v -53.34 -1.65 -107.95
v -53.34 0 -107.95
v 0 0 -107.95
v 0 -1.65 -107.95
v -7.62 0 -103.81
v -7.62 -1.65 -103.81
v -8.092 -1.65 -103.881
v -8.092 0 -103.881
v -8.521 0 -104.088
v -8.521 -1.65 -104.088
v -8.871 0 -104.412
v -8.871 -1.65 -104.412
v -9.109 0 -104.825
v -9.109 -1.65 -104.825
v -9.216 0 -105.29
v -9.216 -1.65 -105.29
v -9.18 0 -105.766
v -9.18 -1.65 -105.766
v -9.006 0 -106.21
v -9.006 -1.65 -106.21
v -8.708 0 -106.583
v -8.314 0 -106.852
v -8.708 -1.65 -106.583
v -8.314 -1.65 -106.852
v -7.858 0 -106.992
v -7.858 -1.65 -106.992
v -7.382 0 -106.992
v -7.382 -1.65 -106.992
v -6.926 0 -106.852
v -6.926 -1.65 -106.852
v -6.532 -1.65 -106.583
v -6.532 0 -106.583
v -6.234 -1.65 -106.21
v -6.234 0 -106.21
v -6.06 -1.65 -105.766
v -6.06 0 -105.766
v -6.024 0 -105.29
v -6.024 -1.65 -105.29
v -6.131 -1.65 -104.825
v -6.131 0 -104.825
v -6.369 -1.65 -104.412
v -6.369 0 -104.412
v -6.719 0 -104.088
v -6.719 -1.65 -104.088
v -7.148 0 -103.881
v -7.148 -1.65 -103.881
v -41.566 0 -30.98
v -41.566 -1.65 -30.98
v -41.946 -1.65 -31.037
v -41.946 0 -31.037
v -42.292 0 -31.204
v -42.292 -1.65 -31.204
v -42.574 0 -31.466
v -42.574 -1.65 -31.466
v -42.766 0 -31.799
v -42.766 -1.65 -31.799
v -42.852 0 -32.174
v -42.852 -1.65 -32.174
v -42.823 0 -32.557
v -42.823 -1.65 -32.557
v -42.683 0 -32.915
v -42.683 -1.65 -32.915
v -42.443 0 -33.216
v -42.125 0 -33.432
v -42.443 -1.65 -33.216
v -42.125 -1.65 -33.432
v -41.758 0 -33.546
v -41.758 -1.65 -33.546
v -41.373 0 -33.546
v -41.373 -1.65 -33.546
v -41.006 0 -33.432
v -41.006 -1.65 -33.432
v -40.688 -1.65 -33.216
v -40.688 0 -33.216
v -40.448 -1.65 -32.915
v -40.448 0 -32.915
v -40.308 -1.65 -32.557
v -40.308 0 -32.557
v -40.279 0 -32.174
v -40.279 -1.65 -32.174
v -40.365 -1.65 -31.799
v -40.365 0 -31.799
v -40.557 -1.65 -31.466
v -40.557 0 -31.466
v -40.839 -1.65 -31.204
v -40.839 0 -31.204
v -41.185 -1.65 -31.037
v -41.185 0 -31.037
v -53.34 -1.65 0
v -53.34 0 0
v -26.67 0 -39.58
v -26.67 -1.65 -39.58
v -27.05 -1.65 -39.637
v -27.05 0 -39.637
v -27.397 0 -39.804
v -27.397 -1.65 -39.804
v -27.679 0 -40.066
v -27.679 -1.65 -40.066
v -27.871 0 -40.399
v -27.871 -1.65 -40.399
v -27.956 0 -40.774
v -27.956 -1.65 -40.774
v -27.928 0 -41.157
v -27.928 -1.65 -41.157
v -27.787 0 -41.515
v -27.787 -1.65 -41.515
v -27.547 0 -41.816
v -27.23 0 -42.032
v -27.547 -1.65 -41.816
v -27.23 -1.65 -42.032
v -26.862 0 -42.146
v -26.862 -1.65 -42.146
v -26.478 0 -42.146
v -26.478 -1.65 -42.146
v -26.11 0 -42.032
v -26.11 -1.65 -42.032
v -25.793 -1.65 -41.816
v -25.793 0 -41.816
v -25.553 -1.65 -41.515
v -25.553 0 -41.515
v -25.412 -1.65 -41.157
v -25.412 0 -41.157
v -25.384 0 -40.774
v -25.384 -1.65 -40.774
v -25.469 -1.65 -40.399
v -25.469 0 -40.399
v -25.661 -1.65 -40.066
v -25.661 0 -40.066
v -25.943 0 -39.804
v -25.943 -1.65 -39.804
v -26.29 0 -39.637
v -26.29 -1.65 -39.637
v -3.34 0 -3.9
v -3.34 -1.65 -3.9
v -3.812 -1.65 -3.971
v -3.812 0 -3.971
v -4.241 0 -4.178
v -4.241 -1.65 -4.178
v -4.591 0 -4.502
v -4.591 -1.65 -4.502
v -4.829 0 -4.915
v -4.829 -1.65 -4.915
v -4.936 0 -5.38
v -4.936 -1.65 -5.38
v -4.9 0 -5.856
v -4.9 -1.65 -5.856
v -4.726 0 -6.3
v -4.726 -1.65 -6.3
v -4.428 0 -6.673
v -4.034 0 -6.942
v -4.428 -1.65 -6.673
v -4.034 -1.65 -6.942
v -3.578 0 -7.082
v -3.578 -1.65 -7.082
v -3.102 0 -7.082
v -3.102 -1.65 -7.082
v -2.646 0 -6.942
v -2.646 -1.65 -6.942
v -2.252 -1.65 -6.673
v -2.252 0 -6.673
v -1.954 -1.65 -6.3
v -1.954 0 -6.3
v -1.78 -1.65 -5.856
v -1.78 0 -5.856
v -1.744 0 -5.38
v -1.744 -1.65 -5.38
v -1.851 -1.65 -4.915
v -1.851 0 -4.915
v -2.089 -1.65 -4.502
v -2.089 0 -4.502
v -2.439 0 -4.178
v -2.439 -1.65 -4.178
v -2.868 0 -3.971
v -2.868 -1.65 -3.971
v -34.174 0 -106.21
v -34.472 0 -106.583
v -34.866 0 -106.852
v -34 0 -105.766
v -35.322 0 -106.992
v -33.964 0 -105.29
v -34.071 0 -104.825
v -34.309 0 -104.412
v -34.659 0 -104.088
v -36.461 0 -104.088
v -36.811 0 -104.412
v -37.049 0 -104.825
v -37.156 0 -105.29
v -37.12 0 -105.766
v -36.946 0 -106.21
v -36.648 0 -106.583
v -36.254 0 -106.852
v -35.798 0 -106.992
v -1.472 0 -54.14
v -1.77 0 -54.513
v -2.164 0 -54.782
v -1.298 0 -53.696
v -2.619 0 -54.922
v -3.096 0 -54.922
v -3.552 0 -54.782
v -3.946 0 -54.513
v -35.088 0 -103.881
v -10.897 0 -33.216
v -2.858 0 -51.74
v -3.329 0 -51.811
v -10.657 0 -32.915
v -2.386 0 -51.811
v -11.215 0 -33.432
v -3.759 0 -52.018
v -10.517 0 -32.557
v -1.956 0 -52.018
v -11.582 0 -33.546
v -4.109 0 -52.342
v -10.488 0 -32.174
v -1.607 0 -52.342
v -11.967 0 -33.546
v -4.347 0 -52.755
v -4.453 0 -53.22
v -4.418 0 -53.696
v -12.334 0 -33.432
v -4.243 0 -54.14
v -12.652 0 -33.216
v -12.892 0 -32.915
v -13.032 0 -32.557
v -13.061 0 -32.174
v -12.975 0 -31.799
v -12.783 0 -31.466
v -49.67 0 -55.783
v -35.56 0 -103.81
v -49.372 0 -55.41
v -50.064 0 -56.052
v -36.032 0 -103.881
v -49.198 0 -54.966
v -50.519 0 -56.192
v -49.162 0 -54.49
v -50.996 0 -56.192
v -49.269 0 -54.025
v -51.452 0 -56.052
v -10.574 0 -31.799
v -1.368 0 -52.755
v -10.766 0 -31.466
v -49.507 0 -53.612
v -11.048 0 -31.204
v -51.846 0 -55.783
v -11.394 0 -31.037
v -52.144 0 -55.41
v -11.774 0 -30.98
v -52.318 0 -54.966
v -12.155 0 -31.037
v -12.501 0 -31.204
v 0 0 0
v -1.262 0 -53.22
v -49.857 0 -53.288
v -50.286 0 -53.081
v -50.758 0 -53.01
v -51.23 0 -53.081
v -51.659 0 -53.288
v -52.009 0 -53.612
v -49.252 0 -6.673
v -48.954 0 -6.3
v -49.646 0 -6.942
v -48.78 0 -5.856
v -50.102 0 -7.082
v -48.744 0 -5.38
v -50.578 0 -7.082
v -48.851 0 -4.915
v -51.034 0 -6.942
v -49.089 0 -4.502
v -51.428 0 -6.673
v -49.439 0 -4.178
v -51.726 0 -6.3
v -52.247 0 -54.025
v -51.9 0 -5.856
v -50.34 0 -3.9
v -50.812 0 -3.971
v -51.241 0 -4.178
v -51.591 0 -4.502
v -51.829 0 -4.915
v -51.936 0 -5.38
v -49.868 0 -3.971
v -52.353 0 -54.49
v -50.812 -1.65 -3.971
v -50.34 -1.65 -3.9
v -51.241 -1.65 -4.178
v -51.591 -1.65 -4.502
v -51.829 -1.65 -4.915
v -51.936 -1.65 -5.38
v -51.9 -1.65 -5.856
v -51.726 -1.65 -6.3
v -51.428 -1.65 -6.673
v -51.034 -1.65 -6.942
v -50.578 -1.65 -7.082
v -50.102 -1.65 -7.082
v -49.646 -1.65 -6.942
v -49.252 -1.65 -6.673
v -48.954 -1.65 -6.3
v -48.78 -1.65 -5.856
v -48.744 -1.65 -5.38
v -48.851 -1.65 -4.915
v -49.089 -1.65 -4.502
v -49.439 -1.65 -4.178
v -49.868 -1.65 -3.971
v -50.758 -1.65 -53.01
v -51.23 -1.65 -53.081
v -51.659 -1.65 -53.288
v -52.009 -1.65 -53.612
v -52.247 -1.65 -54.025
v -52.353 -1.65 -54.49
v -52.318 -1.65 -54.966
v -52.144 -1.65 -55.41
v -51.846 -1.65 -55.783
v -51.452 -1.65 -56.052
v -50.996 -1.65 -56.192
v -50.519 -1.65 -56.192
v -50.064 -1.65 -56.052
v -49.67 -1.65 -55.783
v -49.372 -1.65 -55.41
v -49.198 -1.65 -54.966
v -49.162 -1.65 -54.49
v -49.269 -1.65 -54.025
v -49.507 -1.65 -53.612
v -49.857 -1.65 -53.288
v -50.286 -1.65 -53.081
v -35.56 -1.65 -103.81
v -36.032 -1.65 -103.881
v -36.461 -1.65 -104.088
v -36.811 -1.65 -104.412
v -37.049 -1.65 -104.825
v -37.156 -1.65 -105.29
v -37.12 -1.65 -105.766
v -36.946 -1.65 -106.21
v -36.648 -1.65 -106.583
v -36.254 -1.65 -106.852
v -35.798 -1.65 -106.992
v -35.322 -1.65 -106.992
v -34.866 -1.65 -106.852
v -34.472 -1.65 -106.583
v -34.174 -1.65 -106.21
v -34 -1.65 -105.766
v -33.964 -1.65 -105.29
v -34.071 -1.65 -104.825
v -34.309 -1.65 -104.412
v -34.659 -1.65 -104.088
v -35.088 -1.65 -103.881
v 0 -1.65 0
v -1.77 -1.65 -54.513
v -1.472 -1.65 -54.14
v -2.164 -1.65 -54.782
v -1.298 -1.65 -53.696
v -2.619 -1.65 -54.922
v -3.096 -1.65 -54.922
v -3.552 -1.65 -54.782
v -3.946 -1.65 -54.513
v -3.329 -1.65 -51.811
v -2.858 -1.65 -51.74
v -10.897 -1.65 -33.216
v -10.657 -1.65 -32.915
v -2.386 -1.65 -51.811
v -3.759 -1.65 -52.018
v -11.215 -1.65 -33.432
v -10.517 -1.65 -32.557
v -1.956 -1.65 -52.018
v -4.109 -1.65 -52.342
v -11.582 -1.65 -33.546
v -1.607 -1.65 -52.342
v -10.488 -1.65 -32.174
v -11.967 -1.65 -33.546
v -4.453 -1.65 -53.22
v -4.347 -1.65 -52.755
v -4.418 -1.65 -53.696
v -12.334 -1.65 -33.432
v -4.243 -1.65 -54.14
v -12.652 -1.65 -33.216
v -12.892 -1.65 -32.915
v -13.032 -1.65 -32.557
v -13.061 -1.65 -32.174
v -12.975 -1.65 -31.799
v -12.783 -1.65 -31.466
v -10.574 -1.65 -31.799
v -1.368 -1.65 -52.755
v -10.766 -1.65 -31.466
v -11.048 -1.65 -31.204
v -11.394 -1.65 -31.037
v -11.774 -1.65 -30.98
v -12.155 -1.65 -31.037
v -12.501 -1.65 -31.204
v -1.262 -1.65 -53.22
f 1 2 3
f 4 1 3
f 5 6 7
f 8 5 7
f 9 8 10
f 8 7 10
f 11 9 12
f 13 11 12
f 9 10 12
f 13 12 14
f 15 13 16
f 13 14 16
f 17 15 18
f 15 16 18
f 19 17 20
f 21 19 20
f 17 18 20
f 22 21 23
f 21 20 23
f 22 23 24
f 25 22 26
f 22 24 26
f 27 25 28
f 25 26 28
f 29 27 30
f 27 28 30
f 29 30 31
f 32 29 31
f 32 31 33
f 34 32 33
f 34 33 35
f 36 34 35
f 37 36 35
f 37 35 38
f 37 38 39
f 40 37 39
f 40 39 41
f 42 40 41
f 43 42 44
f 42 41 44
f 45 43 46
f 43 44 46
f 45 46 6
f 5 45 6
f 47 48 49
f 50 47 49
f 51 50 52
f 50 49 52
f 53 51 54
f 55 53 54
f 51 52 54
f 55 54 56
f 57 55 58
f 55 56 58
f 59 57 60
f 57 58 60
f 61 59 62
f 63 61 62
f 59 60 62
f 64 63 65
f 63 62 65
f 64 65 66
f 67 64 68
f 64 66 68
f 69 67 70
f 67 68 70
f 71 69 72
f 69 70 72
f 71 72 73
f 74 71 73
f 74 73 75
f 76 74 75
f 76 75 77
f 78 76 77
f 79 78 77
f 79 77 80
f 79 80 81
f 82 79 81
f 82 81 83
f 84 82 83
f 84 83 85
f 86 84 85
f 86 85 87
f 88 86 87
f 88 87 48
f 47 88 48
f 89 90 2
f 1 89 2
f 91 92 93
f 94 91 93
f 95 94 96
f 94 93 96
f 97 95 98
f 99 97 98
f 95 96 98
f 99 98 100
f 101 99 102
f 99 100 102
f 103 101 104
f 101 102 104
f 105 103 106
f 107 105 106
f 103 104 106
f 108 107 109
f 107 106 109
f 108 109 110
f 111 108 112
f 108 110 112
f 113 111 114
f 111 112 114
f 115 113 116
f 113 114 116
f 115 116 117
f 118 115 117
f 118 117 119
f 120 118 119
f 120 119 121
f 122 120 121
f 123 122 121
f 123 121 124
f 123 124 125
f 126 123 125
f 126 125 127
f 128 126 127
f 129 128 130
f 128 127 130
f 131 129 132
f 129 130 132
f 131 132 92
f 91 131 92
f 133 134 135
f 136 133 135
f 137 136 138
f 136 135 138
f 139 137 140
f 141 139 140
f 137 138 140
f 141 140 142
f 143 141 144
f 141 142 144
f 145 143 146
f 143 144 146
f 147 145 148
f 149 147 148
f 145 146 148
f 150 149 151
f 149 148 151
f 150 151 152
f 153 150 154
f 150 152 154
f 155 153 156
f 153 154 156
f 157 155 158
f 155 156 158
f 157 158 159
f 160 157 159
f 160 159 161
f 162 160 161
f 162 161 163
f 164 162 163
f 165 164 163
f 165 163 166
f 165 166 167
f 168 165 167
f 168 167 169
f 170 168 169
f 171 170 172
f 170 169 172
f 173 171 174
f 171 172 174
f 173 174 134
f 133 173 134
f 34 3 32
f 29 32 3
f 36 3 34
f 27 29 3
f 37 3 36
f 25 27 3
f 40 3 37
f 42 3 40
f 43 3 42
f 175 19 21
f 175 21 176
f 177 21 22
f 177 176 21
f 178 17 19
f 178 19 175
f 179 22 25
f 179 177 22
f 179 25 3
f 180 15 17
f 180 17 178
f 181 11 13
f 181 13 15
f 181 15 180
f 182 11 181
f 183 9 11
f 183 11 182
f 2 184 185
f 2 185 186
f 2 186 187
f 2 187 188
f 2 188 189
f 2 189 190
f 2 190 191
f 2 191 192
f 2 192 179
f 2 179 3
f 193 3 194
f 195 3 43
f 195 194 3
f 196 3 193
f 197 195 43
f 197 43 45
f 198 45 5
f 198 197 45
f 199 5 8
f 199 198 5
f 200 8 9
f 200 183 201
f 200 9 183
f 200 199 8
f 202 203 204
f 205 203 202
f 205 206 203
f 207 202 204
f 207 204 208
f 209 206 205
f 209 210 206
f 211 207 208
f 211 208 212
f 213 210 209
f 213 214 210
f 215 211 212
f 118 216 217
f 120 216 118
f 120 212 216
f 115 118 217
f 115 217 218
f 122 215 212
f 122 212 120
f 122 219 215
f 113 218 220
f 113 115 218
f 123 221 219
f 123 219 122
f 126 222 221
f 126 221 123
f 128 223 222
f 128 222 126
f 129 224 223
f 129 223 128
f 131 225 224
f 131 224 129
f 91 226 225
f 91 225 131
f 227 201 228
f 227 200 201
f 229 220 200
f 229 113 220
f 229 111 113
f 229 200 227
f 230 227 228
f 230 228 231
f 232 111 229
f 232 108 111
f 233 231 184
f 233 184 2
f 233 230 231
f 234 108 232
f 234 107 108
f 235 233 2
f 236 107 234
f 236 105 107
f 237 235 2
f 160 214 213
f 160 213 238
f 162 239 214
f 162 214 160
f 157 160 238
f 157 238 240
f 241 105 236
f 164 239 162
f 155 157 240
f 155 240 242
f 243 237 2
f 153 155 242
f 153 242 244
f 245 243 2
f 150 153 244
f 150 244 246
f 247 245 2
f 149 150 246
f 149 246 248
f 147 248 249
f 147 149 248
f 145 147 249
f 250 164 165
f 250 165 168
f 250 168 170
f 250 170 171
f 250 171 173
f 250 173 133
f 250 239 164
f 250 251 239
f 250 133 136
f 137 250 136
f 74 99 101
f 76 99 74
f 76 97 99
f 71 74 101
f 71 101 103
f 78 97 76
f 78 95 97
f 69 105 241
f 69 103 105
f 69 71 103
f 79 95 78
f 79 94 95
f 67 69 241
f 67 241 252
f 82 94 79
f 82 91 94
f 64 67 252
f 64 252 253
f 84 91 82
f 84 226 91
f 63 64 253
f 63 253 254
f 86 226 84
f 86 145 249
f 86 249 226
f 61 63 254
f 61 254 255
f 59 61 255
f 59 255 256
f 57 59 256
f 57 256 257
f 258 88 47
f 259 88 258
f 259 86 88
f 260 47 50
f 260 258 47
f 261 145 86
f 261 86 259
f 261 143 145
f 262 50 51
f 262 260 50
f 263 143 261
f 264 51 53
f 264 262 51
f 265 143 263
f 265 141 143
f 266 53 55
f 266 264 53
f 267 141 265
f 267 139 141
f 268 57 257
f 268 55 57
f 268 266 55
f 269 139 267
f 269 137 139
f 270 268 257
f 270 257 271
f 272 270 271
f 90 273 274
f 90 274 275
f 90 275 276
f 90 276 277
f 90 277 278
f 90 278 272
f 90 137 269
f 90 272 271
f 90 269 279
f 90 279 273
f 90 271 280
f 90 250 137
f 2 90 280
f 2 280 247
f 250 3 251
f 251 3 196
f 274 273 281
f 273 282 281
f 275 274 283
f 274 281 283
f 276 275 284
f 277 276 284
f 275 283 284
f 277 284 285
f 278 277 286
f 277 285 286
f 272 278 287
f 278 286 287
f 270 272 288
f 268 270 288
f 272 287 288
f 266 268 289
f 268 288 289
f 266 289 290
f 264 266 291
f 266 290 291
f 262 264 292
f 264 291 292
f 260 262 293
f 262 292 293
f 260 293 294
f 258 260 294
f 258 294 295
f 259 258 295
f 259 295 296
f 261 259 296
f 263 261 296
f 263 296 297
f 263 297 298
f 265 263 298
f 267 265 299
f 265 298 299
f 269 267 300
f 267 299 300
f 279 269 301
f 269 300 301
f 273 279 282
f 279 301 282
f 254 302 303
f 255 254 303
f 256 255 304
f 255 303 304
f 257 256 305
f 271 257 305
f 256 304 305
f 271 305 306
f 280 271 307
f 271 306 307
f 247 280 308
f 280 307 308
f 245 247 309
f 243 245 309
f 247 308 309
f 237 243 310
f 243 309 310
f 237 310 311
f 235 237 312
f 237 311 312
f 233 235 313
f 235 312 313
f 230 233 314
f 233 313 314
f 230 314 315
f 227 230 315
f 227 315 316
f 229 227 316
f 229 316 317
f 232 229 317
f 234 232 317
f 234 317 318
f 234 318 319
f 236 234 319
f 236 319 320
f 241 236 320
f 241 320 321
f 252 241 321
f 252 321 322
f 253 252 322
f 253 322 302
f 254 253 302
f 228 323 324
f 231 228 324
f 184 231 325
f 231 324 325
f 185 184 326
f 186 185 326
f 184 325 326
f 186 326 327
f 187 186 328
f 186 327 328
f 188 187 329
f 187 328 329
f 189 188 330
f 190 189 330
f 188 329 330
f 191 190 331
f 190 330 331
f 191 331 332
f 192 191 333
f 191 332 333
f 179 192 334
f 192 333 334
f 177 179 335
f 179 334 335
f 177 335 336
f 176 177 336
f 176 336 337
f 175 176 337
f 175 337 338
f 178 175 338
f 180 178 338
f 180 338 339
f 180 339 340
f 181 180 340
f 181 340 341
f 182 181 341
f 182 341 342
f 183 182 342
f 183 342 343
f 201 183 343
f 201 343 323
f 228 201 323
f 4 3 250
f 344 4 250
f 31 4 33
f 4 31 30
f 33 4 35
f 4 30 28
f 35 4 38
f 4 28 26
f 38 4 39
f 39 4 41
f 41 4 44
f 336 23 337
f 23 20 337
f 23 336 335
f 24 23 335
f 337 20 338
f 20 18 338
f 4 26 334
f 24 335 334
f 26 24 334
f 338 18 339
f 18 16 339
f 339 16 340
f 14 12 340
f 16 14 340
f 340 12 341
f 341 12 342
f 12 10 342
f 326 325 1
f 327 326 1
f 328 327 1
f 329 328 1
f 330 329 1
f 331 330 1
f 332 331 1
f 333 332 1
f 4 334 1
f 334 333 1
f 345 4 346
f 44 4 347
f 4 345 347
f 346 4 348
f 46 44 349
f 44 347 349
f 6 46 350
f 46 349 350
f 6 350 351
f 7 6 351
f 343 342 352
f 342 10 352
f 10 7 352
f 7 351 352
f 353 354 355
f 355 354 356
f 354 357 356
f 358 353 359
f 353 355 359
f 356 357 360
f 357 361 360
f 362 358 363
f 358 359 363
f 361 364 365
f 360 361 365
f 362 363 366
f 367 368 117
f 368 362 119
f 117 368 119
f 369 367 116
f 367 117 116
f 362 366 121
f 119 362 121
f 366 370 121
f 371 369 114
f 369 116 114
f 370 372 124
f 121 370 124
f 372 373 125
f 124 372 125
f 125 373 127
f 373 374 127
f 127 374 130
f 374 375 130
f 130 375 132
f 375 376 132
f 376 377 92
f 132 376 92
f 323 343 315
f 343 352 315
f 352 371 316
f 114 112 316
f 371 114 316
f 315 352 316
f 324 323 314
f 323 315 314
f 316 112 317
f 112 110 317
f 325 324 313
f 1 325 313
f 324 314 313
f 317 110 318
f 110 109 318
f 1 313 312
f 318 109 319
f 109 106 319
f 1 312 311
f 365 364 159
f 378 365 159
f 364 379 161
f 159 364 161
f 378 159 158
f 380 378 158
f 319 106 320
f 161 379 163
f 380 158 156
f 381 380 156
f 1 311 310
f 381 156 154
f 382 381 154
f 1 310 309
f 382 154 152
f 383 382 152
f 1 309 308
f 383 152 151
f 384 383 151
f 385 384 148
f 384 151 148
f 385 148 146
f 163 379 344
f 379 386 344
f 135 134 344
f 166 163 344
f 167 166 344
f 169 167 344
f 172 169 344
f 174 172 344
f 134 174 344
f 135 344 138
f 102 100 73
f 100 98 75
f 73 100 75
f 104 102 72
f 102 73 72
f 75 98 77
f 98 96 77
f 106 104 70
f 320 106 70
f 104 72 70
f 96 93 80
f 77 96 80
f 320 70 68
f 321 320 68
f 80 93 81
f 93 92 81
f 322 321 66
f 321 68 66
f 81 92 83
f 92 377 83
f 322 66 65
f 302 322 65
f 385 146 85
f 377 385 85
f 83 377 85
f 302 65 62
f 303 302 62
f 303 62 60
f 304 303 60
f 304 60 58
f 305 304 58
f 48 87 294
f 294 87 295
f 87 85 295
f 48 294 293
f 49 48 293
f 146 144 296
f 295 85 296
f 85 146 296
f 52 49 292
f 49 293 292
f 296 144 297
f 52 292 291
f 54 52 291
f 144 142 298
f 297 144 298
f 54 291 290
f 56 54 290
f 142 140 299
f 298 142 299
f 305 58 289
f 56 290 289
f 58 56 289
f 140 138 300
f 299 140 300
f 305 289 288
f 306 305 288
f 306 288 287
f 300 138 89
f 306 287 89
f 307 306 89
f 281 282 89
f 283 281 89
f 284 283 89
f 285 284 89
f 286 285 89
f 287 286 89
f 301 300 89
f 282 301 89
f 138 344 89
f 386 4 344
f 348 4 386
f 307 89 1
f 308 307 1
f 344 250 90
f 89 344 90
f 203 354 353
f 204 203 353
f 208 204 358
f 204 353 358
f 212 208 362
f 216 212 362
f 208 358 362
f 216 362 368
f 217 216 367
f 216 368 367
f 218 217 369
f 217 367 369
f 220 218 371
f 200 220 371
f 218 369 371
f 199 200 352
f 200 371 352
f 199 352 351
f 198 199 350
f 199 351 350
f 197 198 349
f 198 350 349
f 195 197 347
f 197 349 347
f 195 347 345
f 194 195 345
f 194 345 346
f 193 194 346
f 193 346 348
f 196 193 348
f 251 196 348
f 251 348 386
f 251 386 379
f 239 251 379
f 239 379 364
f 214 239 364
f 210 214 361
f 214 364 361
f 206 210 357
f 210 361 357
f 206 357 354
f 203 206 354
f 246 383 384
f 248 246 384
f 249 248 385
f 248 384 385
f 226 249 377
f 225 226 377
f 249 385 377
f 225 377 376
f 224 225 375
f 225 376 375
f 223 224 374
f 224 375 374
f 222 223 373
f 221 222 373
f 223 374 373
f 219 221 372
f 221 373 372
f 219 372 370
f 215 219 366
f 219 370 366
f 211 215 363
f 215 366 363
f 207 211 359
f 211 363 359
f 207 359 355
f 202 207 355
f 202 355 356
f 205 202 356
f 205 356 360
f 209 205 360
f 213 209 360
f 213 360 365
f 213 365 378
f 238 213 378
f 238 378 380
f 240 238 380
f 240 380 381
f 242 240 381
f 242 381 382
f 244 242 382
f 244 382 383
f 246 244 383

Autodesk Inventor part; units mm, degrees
ref_plane "YZ Plane" through (0, 0, 0) normal (1, 0, 0) x (0, 1, 0)
ref_plane "XZ Plane" through (0, 0, 0) normal (0, 1, 0) x (-1, 0, 0)
ref_plane "XY Plane" through (0, 0, 0) normal (0, 0, 1) x (1, 0, 0)
sketch "Sketch1" plane through (0, 0, 0) normal (0, 1, 0) x (-1, 0, 0)
  line L0 (0, 0) -> (53.34, 0)
  line L1 (53.34, 0) -> (53.34, -107.95)
  line L2 (53.34, -107.95) -> (0, -107.95)
  line L3 (0, -107.95) -> (0, 0)
  point P0 (50.34, -5.5)
  point P1 (3.34, -5.5)
  point P2 (50.7579, -54.61)
  point P3 (2.8578, -53.34)
  point P4 (35.56, -105.41)
  point P5 (7.62, -105.41)
  dimension "d0" = 53.34
  dimension "d1" = 107.95
  dimension "d2" = 3
  dimension "d3" = 5.5
  dimension "d4" = 5.5
  dimension "d5" = 3.34
  dimension "d6" = 53.34
  dimension "d7" = 54.61
  dimension "d8" = 2.54
  dimension "d9" = 2.54
  dimension "d10" = 7.62
  dimension "d11" = 17.78
extrude "Extrusion1" add sketch "Sketch1" against normal blind 1.65
hole "Hole1" at (-50.34, 0, -5.5) at (-3.34, 0, -5.5) at (-50.7579, 0, -54.61) at (-2.8578, 0, -53.34) at (-35.56, 0, -105.41) at (-7.62, 0, -105.41) direction (0, -1, 0) diameter 3.2 end through all
sketch "Sketch2" plane through (0, 0, 0) normal (0, 1, 0) x (1, 0, 0)
  line L0 (-53.34, 0) -> (0, 0) projected
  line L1 (0, 0) -> (0, 107.95) projected
  circle A0 centre (-26.67, 23.67) radius 17.2
  line L2 (-26.67, 23.67) -> (-26.67, 130.1739)
  line L3 (-26.67, 23.67) -> (-67.3773, 47.1724)
  line L4 (-26.67, 23.67) -> (20.3348, 23.67) construction
  line L5 (-26.67, 23.67) -> (24.306, 53.101)
  line L6 (-26.67, 23.67) -> (32.192, 23.67) construction
  point P0 (-26.67, 40.87)
  point P1 (-11.7744, 32.27)
  point P2 (-26.67, 40.87)
  point P3 (-41.5656, 32.27)
  dimension "d21" = 23.67
  dimension "d22" = 26.67
  dimension "d23" = 34.4
  dimension "d24" = 150
  dimension "d25" = 30
hole "Hole2" at (-26.67, 0, -40.87) at (-11.7744, 0, -32.27) at (-41.5656, 0, -32.27) direction (0, -1, 0) diameter 2.58 end through all
properties part number "EChem Sensor Board Lower"
